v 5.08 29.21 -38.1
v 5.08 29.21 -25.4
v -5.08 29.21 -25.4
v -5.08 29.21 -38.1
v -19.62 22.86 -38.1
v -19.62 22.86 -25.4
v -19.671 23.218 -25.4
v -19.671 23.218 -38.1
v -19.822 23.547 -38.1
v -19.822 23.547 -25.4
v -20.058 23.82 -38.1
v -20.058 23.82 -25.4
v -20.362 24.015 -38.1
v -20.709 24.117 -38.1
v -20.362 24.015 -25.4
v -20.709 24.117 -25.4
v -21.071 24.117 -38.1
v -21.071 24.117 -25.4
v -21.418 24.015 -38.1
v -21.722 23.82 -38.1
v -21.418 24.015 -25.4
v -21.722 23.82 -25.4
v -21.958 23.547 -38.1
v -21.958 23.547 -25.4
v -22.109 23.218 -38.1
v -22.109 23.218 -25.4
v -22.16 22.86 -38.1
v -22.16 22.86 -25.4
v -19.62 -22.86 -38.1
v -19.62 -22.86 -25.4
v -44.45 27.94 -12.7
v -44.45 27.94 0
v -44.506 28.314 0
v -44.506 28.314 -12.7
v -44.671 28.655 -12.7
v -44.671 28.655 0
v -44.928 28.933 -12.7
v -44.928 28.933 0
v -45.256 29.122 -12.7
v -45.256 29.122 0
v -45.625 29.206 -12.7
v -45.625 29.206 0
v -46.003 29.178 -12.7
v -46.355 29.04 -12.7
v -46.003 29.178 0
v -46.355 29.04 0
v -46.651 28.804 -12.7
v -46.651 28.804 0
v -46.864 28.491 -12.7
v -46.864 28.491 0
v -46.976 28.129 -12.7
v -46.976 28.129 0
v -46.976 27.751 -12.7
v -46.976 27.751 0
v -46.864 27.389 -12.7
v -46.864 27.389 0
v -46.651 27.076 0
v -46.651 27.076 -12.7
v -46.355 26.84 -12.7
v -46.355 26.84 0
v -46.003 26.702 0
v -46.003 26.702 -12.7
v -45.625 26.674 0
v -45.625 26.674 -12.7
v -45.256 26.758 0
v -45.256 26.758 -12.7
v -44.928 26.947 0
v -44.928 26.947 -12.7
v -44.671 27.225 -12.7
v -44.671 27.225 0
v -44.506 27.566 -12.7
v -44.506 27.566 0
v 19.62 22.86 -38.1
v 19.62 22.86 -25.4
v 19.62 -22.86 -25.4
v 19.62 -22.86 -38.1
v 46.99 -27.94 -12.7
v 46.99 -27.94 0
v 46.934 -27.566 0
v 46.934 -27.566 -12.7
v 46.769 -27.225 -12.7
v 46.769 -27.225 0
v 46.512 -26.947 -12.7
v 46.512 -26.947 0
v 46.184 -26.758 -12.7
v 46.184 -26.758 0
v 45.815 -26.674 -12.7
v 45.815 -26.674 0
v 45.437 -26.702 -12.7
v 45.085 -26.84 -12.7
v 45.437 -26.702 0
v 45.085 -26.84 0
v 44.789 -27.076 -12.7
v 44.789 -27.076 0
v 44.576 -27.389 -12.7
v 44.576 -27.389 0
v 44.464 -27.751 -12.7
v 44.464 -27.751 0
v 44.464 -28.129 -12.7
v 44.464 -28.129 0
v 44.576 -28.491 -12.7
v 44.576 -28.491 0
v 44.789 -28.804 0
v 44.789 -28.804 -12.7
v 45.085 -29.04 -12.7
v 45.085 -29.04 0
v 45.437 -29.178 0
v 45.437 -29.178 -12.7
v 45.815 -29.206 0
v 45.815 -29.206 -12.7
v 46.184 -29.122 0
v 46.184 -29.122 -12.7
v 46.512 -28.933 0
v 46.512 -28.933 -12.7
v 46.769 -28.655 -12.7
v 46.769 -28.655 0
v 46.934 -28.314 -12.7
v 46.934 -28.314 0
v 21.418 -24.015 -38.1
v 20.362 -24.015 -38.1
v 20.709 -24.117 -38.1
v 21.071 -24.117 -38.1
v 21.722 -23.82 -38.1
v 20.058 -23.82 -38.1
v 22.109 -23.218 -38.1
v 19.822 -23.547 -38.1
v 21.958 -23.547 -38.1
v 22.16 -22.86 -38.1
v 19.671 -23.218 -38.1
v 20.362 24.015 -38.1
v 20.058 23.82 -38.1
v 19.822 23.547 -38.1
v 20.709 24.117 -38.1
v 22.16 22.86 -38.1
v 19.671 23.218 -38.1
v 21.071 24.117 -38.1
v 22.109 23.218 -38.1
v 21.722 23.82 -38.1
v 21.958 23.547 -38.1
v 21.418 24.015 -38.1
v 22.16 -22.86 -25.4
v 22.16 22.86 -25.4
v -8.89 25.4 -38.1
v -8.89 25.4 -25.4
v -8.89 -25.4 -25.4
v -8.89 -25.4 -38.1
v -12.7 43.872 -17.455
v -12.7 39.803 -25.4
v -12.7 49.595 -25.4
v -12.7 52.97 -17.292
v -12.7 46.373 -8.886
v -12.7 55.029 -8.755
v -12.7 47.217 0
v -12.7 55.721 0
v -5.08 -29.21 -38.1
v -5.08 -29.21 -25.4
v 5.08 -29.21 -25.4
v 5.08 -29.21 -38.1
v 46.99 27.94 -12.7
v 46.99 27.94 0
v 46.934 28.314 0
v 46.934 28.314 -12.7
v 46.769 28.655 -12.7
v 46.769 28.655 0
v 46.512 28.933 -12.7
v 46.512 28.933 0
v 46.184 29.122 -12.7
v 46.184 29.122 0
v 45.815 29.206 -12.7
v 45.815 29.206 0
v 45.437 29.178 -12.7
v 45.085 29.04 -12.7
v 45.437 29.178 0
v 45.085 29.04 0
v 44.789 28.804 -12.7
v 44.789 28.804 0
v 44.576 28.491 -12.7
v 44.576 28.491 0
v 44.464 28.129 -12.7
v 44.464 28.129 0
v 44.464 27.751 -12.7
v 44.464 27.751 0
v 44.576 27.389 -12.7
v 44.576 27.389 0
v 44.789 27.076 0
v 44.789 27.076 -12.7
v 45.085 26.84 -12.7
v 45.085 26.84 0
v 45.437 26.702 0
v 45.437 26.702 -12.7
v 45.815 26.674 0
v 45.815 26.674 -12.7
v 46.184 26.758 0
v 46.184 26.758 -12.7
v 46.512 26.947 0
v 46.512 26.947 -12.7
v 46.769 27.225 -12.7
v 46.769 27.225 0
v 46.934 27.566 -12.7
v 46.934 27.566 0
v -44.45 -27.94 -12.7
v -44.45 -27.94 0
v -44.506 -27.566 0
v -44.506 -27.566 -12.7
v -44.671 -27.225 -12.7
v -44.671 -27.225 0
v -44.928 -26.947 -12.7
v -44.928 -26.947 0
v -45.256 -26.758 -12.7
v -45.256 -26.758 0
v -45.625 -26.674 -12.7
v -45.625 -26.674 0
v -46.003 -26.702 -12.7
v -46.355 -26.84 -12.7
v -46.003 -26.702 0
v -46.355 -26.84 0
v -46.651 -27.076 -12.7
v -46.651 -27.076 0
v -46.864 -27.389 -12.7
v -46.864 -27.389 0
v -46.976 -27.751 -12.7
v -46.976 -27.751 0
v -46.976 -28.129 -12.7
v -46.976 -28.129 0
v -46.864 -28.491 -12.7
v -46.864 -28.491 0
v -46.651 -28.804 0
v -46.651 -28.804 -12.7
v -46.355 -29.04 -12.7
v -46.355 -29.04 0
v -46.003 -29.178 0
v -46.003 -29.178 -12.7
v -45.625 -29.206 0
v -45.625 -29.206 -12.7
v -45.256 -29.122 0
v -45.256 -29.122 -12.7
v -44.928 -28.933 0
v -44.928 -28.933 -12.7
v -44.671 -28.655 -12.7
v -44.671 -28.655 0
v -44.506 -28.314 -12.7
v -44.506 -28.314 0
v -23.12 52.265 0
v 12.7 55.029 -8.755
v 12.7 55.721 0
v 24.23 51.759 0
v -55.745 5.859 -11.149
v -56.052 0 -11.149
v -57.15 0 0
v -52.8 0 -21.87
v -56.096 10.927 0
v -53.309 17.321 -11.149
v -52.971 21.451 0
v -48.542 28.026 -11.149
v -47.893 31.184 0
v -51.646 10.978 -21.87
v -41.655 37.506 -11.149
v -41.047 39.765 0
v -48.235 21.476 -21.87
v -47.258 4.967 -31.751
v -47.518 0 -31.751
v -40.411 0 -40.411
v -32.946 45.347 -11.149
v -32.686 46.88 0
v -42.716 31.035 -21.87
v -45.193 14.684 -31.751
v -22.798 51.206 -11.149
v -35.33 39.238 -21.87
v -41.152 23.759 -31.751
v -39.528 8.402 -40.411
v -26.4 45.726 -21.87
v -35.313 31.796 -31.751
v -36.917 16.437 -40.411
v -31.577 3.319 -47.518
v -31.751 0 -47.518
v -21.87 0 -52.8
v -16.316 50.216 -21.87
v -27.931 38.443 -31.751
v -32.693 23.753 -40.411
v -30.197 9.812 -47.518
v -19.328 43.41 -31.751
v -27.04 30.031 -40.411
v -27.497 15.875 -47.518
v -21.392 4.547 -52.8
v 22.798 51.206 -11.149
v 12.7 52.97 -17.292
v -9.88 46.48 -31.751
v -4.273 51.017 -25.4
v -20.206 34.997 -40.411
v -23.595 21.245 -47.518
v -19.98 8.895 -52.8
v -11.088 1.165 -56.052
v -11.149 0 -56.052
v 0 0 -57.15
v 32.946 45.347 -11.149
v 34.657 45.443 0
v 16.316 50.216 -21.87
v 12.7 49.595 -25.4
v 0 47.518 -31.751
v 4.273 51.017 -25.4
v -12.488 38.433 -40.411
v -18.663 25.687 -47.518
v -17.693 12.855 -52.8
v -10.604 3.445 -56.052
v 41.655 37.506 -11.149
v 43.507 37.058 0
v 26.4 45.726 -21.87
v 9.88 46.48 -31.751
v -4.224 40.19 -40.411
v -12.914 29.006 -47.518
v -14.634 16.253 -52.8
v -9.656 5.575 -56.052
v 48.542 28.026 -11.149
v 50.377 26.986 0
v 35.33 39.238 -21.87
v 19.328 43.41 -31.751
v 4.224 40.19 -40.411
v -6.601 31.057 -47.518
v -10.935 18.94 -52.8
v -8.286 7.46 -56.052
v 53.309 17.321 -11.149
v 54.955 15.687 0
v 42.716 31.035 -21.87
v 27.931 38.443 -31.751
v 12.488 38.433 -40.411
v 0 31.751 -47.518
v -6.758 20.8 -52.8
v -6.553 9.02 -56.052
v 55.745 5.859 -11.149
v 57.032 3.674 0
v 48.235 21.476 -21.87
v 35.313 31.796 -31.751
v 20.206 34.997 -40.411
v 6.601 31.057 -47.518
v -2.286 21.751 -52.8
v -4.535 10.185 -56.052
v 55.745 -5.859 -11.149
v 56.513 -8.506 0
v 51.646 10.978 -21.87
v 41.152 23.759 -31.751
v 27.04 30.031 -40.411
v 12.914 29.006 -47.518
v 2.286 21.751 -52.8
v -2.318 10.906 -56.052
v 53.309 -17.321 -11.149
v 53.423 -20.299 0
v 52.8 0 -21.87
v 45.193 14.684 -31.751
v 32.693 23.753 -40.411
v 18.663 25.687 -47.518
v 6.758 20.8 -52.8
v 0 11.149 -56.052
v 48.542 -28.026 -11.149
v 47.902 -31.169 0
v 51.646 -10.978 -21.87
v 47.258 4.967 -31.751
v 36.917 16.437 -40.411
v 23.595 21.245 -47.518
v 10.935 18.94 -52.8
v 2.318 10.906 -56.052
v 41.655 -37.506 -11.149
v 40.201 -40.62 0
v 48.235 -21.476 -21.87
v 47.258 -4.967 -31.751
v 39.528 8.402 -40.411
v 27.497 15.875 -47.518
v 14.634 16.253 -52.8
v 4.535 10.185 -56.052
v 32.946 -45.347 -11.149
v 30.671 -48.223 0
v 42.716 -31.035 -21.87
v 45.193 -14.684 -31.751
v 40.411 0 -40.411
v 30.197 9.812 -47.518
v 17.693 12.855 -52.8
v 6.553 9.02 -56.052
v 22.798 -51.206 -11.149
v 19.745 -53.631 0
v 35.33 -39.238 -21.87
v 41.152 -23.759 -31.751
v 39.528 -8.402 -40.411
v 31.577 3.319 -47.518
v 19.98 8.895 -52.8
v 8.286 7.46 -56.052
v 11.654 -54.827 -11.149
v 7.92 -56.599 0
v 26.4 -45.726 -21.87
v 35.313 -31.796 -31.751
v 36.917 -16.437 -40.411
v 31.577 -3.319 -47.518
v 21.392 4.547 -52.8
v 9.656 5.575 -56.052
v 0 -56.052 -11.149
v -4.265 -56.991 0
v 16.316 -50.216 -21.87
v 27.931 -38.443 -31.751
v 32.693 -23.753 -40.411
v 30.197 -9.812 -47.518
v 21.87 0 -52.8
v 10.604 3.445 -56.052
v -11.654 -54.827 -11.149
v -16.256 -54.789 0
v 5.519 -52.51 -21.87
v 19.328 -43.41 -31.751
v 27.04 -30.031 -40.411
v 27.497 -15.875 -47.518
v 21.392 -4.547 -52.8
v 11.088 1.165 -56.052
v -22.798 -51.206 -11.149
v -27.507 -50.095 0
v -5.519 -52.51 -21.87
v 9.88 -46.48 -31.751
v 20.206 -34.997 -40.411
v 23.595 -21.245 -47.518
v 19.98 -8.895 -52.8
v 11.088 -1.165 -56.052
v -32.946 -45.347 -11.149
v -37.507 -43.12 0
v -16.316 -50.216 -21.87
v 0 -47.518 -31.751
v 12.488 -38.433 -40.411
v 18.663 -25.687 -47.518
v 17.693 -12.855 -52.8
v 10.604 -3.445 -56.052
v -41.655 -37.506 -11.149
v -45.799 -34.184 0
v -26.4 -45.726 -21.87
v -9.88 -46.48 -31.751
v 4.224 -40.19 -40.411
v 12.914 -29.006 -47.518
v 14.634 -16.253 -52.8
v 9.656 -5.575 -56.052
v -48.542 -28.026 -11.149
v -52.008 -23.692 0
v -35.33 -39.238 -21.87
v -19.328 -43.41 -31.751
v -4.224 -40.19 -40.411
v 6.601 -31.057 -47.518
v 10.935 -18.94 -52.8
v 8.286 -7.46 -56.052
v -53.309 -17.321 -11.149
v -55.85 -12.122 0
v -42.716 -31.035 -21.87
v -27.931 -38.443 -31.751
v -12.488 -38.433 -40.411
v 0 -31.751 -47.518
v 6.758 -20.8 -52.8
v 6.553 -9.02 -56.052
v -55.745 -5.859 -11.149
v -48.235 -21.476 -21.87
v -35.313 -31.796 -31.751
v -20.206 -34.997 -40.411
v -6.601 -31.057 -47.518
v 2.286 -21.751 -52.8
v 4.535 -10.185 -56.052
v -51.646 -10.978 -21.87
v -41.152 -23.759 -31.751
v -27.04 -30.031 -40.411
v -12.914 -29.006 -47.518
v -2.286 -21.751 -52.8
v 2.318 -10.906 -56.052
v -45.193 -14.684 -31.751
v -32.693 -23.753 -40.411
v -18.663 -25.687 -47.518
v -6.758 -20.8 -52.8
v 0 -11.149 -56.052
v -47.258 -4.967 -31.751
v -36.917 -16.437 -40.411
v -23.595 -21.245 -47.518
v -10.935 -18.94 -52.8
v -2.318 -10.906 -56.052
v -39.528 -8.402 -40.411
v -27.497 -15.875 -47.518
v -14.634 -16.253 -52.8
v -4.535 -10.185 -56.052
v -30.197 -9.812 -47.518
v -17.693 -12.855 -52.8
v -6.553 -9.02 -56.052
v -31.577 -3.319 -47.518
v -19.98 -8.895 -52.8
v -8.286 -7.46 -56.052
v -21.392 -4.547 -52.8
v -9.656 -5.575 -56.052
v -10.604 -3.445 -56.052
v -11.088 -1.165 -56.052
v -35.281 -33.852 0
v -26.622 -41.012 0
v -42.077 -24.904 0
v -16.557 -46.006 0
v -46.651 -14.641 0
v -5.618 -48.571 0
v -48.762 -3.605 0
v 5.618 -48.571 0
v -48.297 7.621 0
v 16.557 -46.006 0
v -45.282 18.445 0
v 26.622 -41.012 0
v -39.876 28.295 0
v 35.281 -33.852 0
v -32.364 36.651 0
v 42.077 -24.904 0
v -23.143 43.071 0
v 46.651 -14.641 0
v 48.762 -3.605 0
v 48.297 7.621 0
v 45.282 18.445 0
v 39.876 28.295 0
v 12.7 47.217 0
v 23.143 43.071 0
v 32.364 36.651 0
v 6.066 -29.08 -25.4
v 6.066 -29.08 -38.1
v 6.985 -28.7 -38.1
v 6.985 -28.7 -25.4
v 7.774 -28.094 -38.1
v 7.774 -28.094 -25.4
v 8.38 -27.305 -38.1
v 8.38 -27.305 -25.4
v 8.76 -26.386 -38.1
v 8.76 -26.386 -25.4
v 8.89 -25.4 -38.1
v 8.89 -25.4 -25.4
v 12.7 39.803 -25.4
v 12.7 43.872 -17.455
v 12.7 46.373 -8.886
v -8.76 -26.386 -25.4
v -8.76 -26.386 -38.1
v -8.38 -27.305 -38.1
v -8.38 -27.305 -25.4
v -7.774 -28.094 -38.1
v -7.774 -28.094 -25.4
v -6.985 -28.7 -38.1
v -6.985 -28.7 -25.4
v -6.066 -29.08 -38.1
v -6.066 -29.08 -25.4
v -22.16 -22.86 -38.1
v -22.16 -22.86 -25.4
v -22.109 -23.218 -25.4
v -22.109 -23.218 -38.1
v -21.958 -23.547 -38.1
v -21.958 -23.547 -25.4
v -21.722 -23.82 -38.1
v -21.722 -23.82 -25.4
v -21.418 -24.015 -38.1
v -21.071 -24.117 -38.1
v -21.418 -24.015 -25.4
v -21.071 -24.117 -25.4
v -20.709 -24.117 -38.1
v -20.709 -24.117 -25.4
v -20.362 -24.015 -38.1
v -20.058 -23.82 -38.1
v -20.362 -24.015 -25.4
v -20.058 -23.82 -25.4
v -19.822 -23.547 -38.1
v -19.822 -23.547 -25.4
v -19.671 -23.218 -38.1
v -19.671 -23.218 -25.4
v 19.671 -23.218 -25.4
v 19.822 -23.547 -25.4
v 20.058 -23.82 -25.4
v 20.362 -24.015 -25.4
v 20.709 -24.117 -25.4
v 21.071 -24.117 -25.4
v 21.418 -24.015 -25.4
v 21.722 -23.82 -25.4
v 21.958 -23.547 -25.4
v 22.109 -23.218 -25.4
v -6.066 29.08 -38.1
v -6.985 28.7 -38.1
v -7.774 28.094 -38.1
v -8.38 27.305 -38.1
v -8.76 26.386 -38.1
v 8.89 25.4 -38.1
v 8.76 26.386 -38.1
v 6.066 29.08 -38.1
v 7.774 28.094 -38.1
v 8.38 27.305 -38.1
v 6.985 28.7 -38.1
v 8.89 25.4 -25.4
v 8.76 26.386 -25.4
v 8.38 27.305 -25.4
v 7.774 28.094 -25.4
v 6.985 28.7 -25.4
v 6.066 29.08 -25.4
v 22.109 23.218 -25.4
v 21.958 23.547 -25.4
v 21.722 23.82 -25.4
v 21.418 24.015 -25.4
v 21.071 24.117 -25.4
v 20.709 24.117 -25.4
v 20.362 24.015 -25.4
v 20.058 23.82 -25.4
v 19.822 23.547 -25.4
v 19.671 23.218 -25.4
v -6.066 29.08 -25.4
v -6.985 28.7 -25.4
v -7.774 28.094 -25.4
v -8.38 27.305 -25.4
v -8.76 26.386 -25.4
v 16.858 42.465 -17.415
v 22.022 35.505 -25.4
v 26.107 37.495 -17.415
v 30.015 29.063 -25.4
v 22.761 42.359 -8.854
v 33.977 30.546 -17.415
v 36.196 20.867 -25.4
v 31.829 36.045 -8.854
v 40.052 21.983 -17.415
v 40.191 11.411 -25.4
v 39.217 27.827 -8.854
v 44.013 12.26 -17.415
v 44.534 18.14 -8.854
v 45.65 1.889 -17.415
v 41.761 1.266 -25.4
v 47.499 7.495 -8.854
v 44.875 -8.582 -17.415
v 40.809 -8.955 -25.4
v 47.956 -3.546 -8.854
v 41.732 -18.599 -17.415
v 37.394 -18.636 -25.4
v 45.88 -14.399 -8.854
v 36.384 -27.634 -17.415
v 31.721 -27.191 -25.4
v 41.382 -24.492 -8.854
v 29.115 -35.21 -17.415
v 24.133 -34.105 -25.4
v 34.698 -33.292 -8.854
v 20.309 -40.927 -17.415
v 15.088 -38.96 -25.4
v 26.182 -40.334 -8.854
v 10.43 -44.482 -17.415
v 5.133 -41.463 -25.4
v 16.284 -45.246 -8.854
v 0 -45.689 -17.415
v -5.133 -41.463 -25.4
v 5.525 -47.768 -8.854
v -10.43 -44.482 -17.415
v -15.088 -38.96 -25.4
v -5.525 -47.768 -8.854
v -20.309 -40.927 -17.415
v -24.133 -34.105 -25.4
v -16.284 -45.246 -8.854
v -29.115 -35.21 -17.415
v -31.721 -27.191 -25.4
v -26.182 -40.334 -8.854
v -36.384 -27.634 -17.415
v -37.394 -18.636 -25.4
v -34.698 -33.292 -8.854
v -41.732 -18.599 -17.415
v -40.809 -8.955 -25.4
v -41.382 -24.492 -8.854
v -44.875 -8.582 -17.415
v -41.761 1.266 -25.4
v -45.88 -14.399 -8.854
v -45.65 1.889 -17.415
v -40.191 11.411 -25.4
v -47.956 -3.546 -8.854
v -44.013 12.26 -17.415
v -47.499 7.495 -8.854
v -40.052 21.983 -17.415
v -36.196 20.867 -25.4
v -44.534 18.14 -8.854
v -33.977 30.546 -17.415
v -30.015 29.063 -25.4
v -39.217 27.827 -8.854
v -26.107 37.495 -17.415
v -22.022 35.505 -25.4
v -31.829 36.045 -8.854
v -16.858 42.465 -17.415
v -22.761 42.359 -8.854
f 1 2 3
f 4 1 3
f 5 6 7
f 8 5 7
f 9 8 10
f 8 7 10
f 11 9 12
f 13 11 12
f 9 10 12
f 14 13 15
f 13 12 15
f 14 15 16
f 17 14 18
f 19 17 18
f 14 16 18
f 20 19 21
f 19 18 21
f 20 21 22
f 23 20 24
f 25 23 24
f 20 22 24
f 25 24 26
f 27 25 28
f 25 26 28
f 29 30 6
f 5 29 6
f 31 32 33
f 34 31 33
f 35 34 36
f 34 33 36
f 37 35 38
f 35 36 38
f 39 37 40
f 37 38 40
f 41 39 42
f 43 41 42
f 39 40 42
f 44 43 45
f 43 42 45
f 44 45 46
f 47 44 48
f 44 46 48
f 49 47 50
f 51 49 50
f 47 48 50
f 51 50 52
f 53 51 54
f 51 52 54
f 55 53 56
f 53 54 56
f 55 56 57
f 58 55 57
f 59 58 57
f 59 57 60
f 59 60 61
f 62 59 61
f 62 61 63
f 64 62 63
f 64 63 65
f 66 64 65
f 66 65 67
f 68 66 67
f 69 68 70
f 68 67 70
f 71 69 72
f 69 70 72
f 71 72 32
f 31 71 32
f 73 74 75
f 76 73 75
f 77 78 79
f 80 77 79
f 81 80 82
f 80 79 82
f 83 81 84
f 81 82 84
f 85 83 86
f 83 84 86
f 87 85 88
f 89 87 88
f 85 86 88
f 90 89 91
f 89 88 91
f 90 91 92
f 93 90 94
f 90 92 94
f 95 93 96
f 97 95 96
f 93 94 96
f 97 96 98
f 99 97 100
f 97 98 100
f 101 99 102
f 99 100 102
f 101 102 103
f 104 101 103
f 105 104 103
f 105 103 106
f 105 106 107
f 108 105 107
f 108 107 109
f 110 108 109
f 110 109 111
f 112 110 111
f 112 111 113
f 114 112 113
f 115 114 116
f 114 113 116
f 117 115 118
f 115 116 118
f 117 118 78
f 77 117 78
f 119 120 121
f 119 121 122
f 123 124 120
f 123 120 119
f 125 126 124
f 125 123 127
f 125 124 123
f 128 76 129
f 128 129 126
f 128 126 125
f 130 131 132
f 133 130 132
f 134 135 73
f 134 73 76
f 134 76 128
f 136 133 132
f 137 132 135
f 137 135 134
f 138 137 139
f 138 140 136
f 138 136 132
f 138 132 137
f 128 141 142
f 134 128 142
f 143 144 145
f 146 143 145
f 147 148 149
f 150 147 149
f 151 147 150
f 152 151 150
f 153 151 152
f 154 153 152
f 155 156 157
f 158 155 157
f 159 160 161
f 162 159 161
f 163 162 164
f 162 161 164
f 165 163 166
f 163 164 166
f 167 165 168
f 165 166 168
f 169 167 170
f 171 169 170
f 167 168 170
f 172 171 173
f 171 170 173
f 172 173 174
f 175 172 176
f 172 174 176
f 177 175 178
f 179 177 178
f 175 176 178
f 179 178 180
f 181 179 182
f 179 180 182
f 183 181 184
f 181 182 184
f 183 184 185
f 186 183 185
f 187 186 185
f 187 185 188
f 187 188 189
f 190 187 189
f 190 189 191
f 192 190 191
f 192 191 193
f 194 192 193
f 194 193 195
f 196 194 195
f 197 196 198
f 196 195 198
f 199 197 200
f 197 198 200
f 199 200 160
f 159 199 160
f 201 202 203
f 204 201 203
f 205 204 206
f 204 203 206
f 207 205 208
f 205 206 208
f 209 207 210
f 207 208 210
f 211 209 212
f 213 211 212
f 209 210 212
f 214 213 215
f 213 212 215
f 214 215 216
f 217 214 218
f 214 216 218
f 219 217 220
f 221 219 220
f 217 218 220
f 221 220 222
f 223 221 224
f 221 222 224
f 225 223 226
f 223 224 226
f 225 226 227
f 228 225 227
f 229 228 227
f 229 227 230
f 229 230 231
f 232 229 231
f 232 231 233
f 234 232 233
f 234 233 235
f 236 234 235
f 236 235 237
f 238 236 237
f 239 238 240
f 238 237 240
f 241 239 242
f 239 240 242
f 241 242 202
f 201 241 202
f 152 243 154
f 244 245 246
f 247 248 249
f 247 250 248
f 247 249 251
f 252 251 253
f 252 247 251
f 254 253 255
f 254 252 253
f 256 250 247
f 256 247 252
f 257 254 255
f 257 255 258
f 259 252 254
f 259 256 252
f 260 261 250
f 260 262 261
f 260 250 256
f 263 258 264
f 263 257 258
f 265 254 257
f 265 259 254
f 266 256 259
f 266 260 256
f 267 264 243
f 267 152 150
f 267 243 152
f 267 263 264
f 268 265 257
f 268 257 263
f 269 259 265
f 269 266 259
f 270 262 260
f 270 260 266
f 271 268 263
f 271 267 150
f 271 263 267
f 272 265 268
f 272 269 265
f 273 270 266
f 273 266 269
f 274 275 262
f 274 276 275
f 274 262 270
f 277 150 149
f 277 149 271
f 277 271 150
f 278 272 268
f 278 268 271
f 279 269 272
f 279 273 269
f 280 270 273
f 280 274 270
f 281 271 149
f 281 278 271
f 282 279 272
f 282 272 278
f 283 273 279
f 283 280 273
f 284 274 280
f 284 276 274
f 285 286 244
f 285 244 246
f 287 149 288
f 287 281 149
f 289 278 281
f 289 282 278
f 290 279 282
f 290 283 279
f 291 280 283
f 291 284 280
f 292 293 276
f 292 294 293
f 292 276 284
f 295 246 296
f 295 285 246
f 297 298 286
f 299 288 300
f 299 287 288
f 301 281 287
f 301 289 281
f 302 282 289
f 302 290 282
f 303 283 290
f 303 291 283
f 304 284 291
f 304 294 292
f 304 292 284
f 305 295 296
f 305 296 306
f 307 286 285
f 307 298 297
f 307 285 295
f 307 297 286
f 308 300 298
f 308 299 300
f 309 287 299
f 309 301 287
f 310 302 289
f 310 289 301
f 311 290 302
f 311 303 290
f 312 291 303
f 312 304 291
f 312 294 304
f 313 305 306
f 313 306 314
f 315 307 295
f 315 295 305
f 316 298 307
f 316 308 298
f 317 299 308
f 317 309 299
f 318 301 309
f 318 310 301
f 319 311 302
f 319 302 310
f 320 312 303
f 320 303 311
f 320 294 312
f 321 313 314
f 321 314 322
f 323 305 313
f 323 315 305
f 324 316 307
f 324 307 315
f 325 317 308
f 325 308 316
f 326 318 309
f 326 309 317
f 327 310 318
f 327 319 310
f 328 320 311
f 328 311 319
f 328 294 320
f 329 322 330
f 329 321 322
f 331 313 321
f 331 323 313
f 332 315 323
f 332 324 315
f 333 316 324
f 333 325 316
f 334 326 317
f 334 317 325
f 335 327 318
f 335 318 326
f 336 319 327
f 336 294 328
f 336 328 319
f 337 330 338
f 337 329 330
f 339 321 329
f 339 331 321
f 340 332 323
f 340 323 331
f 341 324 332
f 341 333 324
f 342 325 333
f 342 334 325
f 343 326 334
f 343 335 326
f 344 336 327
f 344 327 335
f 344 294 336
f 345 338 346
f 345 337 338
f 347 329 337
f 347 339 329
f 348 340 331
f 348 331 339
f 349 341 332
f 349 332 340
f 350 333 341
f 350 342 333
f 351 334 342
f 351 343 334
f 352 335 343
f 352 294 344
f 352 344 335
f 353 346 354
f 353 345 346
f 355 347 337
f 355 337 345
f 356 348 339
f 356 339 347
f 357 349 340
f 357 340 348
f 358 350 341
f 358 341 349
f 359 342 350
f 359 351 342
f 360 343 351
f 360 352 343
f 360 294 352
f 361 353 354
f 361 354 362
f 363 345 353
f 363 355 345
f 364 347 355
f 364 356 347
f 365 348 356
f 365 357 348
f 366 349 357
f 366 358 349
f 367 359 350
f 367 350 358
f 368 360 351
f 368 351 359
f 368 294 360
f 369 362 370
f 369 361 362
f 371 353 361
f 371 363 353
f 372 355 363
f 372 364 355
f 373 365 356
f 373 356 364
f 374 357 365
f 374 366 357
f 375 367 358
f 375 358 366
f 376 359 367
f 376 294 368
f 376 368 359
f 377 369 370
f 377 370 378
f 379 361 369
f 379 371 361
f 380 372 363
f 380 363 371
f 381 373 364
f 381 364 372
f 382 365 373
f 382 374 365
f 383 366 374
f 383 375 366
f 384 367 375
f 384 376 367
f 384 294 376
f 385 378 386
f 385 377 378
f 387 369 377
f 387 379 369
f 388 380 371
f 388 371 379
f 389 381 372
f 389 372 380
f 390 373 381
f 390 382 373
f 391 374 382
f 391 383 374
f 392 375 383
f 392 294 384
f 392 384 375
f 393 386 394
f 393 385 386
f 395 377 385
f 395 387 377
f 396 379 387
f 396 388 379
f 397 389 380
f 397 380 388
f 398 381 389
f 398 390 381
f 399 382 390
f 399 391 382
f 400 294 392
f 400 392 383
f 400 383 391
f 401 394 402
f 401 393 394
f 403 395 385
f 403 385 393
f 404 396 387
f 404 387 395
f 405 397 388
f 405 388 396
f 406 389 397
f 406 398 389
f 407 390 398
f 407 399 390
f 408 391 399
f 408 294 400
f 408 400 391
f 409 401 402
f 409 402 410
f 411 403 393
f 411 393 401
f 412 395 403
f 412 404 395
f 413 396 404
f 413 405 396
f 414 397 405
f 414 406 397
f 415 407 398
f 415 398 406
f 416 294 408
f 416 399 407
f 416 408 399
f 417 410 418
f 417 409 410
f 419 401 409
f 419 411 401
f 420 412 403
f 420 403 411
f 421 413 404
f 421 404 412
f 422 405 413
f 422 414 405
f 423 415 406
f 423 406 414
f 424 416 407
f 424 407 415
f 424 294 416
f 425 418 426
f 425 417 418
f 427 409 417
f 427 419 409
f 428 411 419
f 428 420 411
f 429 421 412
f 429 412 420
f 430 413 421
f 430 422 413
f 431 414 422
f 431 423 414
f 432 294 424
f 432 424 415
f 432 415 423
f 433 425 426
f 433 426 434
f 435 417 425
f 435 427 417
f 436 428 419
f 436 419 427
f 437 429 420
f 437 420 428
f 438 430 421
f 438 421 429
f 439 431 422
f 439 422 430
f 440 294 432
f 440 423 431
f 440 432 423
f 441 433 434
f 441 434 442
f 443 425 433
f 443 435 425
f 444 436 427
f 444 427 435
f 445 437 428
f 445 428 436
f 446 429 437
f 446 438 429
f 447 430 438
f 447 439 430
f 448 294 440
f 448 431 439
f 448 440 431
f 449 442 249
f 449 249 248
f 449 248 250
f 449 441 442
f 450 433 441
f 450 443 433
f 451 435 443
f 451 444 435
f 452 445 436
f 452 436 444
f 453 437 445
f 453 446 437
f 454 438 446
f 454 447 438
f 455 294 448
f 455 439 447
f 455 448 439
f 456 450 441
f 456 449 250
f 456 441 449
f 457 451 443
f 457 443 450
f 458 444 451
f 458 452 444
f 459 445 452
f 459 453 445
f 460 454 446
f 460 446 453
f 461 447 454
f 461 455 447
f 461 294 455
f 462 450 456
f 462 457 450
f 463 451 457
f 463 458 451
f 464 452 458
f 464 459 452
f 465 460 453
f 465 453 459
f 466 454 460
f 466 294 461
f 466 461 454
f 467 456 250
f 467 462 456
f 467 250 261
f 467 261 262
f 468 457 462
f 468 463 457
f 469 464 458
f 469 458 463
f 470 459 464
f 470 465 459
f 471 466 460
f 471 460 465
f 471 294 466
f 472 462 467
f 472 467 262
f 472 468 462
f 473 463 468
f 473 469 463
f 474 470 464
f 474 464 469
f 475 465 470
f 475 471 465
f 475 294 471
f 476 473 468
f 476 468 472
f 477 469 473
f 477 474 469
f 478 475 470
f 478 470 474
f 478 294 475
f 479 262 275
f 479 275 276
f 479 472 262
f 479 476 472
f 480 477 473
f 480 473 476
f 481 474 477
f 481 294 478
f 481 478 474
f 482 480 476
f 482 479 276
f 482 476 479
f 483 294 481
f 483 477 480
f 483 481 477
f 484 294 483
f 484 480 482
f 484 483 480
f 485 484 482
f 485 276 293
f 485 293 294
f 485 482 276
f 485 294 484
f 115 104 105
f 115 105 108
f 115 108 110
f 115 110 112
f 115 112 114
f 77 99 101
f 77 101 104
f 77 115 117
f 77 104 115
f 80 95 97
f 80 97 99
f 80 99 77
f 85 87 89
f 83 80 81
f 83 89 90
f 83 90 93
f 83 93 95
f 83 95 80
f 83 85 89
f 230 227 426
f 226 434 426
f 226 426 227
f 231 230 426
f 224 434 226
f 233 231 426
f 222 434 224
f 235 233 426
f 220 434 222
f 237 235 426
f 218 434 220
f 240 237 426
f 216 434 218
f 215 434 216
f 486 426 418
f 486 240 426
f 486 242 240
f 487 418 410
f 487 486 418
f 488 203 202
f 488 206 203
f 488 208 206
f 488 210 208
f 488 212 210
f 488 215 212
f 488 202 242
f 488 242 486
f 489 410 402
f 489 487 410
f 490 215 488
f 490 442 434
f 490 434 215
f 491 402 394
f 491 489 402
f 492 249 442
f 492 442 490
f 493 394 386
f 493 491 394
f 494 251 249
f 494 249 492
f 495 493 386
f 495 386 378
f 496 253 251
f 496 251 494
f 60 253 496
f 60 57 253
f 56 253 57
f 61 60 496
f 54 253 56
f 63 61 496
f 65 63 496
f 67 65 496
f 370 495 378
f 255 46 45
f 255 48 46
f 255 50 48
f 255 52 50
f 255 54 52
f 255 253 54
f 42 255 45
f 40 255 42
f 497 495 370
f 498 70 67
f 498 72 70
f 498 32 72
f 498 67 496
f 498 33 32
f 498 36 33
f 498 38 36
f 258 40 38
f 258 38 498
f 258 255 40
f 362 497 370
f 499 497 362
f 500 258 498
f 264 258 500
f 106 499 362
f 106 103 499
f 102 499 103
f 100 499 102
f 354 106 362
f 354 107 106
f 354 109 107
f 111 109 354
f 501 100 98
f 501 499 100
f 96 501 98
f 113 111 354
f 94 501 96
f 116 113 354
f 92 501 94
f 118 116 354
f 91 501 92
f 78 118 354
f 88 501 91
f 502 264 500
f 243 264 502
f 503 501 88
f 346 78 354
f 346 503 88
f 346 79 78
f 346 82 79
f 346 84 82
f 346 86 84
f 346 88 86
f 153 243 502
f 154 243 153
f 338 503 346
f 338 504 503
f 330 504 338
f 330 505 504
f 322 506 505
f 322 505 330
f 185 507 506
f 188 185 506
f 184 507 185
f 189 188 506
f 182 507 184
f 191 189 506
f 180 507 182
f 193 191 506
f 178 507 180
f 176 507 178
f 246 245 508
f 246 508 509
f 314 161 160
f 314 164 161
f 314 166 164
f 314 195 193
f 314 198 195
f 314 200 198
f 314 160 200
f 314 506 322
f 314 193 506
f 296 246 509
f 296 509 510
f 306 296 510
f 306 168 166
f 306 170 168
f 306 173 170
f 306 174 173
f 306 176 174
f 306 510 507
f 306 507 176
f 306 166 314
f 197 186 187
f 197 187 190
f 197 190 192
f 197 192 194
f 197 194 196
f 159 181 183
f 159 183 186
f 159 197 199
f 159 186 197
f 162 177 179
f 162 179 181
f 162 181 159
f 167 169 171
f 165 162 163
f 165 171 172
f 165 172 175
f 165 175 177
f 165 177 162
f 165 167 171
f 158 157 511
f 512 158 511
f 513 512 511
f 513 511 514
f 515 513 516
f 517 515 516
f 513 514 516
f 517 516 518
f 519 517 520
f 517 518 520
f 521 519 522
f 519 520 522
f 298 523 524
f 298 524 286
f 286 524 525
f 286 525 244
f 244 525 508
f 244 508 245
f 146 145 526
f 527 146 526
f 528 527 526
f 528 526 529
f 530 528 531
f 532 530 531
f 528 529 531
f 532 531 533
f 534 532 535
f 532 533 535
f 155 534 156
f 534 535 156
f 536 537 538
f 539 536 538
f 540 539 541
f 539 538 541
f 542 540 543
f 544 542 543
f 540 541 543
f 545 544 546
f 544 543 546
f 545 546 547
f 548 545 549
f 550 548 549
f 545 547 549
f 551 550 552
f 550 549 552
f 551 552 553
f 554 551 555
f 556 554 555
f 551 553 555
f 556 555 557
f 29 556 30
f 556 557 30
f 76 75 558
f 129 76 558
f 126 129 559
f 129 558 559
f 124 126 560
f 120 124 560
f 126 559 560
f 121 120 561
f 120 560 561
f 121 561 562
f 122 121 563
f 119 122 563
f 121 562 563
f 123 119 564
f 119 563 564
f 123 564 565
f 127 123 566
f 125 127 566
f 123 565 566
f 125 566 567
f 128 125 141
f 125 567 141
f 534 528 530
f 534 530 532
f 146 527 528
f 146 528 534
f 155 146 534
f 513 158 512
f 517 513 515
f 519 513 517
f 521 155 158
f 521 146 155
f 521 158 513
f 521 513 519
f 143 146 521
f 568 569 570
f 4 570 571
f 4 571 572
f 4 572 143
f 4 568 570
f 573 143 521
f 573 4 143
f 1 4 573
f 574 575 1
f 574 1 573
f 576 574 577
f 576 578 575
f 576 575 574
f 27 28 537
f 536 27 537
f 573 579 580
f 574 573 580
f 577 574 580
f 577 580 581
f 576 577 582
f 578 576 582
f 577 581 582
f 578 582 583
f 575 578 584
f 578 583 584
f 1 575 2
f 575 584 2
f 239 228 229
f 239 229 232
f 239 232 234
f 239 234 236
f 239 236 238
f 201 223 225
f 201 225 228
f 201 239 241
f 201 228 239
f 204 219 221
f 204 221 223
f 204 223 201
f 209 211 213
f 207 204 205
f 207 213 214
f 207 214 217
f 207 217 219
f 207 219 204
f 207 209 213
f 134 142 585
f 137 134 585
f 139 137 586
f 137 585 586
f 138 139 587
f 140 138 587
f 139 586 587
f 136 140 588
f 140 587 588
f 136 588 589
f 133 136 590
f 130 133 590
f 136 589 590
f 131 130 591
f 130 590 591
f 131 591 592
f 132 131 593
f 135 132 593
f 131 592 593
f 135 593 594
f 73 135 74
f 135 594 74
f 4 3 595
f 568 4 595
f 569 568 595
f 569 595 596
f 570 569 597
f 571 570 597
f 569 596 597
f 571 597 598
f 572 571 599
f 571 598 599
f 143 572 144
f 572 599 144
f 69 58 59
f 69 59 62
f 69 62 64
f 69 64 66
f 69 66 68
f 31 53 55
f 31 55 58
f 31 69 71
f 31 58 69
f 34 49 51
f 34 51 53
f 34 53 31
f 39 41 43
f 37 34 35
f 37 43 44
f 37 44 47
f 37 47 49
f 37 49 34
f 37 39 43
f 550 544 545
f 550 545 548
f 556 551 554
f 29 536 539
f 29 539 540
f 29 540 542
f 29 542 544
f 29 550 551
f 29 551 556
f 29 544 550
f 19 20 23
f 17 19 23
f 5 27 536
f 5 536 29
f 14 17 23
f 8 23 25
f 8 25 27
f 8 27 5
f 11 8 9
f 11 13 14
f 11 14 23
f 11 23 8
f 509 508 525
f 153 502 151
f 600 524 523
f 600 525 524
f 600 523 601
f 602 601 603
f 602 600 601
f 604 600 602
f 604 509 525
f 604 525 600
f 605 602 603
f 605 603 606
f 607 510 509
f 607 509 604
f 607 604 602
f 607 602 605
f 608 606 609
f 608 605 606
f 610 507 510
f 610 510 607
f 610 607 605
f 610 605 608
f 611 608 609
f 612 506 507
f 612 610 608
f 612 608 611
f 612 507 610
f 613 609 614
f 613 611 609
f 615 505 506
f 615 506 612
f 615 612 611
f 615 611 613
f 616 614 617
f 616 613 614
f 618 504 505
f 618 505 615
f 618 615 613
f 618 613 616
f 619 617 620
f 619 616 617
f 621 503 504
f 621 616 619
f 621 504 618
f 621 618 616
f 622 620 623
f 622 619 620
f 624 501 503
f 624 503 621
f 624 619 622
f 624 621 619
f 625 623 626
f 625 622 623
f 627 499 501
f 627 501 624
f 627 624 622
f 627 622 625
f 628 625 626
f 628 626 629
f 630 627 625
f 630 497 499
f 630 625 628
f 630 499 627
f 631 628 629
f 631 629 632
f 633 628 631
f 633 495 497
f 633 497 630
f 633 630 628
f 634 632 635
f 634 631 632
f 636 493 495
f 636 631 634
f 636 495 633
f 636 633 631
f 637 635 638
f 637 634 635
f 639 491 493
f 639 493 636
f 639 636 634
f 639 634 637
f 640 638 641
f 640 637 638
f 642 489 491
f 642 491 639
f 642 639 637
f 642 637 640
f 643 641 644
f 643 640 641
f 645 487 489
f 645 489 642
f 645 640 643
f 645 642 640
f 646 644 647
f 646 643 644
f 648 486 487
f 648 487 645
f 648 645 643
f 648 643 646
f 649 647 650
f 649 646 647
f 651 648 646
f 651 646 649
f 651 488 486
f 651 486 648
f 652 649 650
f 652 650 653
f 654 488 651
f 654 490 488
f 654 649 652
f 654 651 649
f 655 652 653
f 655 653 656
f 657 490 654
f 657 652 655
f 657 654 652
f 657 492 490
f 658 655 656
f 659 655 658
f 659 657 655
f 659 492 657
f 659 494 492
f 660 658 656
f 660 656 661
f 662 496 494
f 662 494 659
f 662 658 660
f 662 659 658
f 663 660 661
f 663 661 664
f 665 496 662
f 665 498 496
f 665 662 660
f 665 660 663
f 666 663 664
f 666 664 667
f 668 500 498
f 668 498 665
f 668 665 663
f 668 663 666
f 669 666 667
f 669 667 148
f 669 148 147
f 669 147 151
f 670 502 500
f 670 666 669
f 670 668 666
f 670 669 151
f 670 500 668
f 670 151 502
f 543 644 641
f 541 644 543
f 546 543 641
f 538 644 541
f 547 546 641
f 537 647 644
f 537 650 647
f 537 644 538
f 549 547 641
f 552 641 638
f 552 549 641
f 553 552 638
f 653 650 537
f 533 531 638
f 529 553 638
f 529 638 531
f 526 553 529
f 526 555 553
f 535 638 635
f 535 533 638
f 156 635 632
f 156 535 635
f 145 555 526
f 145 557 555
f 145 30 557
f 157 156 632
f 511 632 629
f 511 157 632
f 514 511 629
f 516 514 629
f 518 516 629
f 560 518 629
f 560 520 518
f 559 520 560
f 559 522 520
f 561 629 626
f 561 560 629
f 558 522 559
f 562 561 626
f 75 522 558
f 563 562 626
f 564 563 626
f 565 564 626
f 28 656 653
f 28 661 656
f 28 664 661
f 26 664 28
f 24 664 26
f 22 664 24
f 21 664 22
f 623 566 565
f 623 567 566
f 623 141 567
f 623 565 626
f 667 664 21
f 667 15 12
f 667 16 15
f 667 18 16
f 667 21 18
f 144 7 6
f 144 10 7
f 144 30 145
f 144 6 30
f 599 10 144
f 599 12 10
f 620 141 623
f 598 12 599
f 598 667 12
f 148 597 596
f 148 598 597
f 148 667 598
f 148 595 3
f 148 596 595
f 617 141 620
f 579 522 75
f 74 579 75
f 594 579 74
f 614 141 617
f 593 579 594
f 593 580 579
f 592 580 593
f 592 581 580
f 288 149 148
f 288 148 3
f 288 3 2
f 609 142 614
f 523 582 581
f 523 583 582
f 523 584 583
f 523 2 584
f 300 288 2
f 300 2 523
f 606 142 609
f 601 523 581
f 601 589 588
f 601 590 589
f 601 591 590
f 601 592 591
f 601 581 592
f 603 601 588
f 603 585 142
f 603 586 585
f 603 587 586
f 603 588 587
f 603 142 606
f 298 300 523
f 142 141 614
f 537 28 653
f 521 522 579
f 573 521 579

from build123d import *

# Parameters (mm, degrees)
F2_R     = 1.27
F3_DEPTH = 12.7
F5_DEPTH = 12.7
F6_W     = 25.4
F6_H     = 42.3964354956
F7_DEPTH = 25.4


with BuildPart() as f1:
    # F0 (on Front) → F1 (revolve)
    with BuildSketch(Plane.XZ):
        with BuildLine():
            Line((-48.895, 0), (-57.15, 0))
            ThreePointArc((-57.15, 0), (-40.4111525448, -40.4111525448), (0, -57.15))
            Line((0, -57.15), (0, -25.4))
            Line((0, -25.4), (-41.77991174, -25.4))
            ThreePointArc((-41.77991174, -25.4), (-47.0826391015, -13.188863493), (-48.895, 0))
        make_face()
    revolve(axis=Axis((0, 0, -41.275), (0, 0, -1)))

    # F2 (on face) → F3 (cut)
    with BuildSketch(Plane.XY):
        with Locations((45.72, 27.94)):
            Circle(F2_R)
        with Locations((45.72, -27.94)):
            Circle(F2_R)
        with Locations((-45.72, -27.94)):
            Circle(F2_R)
        with Locations((-45.72, 27.94)):
            Circle(F2_R)
    extrude(amount=-F3_DEPTH, mode=Mode.SUBTRACT)

    # F4 (on face) → F5 (cut)
    with BuildSketch(Plane.XY.offset(-25.4)):
        with BuildLine():
            Line((-20.88995587, -1.27), (-20.88995587, 0))
            Line((-20.88995587, 0), (-20.88995587, 1.27))
            ThreePointArc((-20.88995587, 1.27), (-21.7879814821, 0.8980256121), (-22.15995587, 0))
            ThreePointArc((-22.15995587, 0), (-21.7879814821, -0.8980256121), (-20.88995587, -1.27))
        make_face()
        with BuildLine():
            Line((-20.88995587, 1.27), (-20.88995587, 0))
            Line((-20.88995587, 0), (-20.88995587, -1.27))
            ThreePointArc((-20.88995587, -1.27), (-19.9919302579, -0.8980256121), (-19.61995587, 0))
            ThreePointArc((-19.61995587, 0), (-19.9919302579, 0.8980256121), (-20.88995587, 1.27))
        make_face()
        with BuildLine():
            ThreePointArc((-22.15995587, 0), (-21.7879814821, 0.8980256121), (-20.88995587, 1.27))
            ThreePointArc((-20.88995587, 1.27), (-19.9919302579, 0.8980256121), (-19.61995587, 0))
            Line((-19.61995587, 0), (-19.61995587, 22.86))
            ThreePointArc((-19.61995587, 22.86), (-20.88995587, 24.13), (-22.15995587, 22.86))
            Line((-22.15995587, 22.86), (-22.15995587, 0))
        make_face()
        with BuildLine():
            ThreePointArc((-19.61995587, 0), (-19.9919302579, -0.8980256121), (-20.88995587, -1.27))
            ThreePointArc((-20.88995587, -1.27), (-21.7879814821, -0.8980256121), (-22.15995587, 0))
            Line((-22.15995587, 0), (-22.15995587, -22.86))
            ThreePointArc((-22.15995587, -22.86), (-20.88995587, -24.13), (-19.61995587, -22.86))
            Line((-19.61995587, -22.86), (-19.61995587, 0))
        make_face()
        with BuildLine():
            Line((20.88995587, -1.27), (20.88995587, 0))
            Line((20.88995587, 0), (20.88995587, 1.27))
            ThreePointArc((20.88995587, 1.27), (19.9919302579, 0.8980256121), (19.61995587, 0))
            ThreePointArc((19.61995587, 0), (19.9919302579, -0.8980256121), (20.88995587, -1.27))
        make_face()
        with BuildLine():
            Line((20.88995587, 1.27), (20.88995587, 0))
            Line((20.88995587, 0), (20.88995587, -1.27))
            ThreePointArc((20.88995587, -1.27), (21.7879814821, -0.8980256121), (22.15995587, 0))
            ThreePointArc((22.15995587, 0), (21.7879814821, 0.8980256121), (20.88995587, 1.27))
        make_face()
        with BuildLine():
            ThreePointArc((19.61995587, 0), (19.9919302579, 0.8980256121), (20.88995587, 1.27))
            ThreePointArc((20.88995587, 1.27), (21.7879814821, 0.8980256121), (22.15995587, 0))
            Line((22.15995587, 0), (22.15995587, 22.86))
            ThreePointArc((22.15995587, 22.86), (20.88995587, 24.13), (19.61995587, 22.86))
            Line((19.61995587, 22.86), (19.61995587, 0))
        make_face()
        with BuildLine():
            ThreePointArc((22.15995587, 0), (21.7879814821, -0.8980256121), (20.88995587, -1.27))
            ThreePointArc((20.88995587, -1.27), (19.9919302579, -0.8980256121), (19.61995587, 0))
            Line((19.61995587, 0), (19.61995587, -22.86))
            ThreePointArc((19.61995587, -22.86), (20.88995587, -24.13), (22.15995587, -22.86))
            Line((22.15995587, -22.86), (22.15995587, 0))
        make_face()
        with BuildLine():
            Line((5.08, 29.21), (-5.08, 29.21))
            ThreePointArc((-5.08, 29.21), (-7.7740768363, 28.0940768363), (-8.89, 25.4))
            Line((-8.89, 25.4), (-8.89, -25.4))
            ThreePointArc((-8.89, -25.4), (-7.7740768363, -28.0940768363), (-5.08, -29.21))
            Line((-5.08, -29.21), (5.08, -29.21))
            ThreePointArc((5.08, -29.21), (7.7740768363, -28.0940768363), (8.89, -25.4))
            Line((8.89, -25.4), (8.89, 25.4))
            ThreePointArc((8.89, 25.4), (7.7740768363, 28.0940768363), (5.08, 29.21))
        make_face()
    extrude(amount=-F5_DEPTH, mode=Mode.SUBTRACT)

    # F6 (on face) → F7 (cut)
    with BuildSketch(Plane.XY):
        with Locations((0, 51.4418943548)):
            Rectangle(F6_W, F6_H)
    extrude(amount=-F7_DEPTH, mode=Mode.SUBTRACT)


solid = f1.part
